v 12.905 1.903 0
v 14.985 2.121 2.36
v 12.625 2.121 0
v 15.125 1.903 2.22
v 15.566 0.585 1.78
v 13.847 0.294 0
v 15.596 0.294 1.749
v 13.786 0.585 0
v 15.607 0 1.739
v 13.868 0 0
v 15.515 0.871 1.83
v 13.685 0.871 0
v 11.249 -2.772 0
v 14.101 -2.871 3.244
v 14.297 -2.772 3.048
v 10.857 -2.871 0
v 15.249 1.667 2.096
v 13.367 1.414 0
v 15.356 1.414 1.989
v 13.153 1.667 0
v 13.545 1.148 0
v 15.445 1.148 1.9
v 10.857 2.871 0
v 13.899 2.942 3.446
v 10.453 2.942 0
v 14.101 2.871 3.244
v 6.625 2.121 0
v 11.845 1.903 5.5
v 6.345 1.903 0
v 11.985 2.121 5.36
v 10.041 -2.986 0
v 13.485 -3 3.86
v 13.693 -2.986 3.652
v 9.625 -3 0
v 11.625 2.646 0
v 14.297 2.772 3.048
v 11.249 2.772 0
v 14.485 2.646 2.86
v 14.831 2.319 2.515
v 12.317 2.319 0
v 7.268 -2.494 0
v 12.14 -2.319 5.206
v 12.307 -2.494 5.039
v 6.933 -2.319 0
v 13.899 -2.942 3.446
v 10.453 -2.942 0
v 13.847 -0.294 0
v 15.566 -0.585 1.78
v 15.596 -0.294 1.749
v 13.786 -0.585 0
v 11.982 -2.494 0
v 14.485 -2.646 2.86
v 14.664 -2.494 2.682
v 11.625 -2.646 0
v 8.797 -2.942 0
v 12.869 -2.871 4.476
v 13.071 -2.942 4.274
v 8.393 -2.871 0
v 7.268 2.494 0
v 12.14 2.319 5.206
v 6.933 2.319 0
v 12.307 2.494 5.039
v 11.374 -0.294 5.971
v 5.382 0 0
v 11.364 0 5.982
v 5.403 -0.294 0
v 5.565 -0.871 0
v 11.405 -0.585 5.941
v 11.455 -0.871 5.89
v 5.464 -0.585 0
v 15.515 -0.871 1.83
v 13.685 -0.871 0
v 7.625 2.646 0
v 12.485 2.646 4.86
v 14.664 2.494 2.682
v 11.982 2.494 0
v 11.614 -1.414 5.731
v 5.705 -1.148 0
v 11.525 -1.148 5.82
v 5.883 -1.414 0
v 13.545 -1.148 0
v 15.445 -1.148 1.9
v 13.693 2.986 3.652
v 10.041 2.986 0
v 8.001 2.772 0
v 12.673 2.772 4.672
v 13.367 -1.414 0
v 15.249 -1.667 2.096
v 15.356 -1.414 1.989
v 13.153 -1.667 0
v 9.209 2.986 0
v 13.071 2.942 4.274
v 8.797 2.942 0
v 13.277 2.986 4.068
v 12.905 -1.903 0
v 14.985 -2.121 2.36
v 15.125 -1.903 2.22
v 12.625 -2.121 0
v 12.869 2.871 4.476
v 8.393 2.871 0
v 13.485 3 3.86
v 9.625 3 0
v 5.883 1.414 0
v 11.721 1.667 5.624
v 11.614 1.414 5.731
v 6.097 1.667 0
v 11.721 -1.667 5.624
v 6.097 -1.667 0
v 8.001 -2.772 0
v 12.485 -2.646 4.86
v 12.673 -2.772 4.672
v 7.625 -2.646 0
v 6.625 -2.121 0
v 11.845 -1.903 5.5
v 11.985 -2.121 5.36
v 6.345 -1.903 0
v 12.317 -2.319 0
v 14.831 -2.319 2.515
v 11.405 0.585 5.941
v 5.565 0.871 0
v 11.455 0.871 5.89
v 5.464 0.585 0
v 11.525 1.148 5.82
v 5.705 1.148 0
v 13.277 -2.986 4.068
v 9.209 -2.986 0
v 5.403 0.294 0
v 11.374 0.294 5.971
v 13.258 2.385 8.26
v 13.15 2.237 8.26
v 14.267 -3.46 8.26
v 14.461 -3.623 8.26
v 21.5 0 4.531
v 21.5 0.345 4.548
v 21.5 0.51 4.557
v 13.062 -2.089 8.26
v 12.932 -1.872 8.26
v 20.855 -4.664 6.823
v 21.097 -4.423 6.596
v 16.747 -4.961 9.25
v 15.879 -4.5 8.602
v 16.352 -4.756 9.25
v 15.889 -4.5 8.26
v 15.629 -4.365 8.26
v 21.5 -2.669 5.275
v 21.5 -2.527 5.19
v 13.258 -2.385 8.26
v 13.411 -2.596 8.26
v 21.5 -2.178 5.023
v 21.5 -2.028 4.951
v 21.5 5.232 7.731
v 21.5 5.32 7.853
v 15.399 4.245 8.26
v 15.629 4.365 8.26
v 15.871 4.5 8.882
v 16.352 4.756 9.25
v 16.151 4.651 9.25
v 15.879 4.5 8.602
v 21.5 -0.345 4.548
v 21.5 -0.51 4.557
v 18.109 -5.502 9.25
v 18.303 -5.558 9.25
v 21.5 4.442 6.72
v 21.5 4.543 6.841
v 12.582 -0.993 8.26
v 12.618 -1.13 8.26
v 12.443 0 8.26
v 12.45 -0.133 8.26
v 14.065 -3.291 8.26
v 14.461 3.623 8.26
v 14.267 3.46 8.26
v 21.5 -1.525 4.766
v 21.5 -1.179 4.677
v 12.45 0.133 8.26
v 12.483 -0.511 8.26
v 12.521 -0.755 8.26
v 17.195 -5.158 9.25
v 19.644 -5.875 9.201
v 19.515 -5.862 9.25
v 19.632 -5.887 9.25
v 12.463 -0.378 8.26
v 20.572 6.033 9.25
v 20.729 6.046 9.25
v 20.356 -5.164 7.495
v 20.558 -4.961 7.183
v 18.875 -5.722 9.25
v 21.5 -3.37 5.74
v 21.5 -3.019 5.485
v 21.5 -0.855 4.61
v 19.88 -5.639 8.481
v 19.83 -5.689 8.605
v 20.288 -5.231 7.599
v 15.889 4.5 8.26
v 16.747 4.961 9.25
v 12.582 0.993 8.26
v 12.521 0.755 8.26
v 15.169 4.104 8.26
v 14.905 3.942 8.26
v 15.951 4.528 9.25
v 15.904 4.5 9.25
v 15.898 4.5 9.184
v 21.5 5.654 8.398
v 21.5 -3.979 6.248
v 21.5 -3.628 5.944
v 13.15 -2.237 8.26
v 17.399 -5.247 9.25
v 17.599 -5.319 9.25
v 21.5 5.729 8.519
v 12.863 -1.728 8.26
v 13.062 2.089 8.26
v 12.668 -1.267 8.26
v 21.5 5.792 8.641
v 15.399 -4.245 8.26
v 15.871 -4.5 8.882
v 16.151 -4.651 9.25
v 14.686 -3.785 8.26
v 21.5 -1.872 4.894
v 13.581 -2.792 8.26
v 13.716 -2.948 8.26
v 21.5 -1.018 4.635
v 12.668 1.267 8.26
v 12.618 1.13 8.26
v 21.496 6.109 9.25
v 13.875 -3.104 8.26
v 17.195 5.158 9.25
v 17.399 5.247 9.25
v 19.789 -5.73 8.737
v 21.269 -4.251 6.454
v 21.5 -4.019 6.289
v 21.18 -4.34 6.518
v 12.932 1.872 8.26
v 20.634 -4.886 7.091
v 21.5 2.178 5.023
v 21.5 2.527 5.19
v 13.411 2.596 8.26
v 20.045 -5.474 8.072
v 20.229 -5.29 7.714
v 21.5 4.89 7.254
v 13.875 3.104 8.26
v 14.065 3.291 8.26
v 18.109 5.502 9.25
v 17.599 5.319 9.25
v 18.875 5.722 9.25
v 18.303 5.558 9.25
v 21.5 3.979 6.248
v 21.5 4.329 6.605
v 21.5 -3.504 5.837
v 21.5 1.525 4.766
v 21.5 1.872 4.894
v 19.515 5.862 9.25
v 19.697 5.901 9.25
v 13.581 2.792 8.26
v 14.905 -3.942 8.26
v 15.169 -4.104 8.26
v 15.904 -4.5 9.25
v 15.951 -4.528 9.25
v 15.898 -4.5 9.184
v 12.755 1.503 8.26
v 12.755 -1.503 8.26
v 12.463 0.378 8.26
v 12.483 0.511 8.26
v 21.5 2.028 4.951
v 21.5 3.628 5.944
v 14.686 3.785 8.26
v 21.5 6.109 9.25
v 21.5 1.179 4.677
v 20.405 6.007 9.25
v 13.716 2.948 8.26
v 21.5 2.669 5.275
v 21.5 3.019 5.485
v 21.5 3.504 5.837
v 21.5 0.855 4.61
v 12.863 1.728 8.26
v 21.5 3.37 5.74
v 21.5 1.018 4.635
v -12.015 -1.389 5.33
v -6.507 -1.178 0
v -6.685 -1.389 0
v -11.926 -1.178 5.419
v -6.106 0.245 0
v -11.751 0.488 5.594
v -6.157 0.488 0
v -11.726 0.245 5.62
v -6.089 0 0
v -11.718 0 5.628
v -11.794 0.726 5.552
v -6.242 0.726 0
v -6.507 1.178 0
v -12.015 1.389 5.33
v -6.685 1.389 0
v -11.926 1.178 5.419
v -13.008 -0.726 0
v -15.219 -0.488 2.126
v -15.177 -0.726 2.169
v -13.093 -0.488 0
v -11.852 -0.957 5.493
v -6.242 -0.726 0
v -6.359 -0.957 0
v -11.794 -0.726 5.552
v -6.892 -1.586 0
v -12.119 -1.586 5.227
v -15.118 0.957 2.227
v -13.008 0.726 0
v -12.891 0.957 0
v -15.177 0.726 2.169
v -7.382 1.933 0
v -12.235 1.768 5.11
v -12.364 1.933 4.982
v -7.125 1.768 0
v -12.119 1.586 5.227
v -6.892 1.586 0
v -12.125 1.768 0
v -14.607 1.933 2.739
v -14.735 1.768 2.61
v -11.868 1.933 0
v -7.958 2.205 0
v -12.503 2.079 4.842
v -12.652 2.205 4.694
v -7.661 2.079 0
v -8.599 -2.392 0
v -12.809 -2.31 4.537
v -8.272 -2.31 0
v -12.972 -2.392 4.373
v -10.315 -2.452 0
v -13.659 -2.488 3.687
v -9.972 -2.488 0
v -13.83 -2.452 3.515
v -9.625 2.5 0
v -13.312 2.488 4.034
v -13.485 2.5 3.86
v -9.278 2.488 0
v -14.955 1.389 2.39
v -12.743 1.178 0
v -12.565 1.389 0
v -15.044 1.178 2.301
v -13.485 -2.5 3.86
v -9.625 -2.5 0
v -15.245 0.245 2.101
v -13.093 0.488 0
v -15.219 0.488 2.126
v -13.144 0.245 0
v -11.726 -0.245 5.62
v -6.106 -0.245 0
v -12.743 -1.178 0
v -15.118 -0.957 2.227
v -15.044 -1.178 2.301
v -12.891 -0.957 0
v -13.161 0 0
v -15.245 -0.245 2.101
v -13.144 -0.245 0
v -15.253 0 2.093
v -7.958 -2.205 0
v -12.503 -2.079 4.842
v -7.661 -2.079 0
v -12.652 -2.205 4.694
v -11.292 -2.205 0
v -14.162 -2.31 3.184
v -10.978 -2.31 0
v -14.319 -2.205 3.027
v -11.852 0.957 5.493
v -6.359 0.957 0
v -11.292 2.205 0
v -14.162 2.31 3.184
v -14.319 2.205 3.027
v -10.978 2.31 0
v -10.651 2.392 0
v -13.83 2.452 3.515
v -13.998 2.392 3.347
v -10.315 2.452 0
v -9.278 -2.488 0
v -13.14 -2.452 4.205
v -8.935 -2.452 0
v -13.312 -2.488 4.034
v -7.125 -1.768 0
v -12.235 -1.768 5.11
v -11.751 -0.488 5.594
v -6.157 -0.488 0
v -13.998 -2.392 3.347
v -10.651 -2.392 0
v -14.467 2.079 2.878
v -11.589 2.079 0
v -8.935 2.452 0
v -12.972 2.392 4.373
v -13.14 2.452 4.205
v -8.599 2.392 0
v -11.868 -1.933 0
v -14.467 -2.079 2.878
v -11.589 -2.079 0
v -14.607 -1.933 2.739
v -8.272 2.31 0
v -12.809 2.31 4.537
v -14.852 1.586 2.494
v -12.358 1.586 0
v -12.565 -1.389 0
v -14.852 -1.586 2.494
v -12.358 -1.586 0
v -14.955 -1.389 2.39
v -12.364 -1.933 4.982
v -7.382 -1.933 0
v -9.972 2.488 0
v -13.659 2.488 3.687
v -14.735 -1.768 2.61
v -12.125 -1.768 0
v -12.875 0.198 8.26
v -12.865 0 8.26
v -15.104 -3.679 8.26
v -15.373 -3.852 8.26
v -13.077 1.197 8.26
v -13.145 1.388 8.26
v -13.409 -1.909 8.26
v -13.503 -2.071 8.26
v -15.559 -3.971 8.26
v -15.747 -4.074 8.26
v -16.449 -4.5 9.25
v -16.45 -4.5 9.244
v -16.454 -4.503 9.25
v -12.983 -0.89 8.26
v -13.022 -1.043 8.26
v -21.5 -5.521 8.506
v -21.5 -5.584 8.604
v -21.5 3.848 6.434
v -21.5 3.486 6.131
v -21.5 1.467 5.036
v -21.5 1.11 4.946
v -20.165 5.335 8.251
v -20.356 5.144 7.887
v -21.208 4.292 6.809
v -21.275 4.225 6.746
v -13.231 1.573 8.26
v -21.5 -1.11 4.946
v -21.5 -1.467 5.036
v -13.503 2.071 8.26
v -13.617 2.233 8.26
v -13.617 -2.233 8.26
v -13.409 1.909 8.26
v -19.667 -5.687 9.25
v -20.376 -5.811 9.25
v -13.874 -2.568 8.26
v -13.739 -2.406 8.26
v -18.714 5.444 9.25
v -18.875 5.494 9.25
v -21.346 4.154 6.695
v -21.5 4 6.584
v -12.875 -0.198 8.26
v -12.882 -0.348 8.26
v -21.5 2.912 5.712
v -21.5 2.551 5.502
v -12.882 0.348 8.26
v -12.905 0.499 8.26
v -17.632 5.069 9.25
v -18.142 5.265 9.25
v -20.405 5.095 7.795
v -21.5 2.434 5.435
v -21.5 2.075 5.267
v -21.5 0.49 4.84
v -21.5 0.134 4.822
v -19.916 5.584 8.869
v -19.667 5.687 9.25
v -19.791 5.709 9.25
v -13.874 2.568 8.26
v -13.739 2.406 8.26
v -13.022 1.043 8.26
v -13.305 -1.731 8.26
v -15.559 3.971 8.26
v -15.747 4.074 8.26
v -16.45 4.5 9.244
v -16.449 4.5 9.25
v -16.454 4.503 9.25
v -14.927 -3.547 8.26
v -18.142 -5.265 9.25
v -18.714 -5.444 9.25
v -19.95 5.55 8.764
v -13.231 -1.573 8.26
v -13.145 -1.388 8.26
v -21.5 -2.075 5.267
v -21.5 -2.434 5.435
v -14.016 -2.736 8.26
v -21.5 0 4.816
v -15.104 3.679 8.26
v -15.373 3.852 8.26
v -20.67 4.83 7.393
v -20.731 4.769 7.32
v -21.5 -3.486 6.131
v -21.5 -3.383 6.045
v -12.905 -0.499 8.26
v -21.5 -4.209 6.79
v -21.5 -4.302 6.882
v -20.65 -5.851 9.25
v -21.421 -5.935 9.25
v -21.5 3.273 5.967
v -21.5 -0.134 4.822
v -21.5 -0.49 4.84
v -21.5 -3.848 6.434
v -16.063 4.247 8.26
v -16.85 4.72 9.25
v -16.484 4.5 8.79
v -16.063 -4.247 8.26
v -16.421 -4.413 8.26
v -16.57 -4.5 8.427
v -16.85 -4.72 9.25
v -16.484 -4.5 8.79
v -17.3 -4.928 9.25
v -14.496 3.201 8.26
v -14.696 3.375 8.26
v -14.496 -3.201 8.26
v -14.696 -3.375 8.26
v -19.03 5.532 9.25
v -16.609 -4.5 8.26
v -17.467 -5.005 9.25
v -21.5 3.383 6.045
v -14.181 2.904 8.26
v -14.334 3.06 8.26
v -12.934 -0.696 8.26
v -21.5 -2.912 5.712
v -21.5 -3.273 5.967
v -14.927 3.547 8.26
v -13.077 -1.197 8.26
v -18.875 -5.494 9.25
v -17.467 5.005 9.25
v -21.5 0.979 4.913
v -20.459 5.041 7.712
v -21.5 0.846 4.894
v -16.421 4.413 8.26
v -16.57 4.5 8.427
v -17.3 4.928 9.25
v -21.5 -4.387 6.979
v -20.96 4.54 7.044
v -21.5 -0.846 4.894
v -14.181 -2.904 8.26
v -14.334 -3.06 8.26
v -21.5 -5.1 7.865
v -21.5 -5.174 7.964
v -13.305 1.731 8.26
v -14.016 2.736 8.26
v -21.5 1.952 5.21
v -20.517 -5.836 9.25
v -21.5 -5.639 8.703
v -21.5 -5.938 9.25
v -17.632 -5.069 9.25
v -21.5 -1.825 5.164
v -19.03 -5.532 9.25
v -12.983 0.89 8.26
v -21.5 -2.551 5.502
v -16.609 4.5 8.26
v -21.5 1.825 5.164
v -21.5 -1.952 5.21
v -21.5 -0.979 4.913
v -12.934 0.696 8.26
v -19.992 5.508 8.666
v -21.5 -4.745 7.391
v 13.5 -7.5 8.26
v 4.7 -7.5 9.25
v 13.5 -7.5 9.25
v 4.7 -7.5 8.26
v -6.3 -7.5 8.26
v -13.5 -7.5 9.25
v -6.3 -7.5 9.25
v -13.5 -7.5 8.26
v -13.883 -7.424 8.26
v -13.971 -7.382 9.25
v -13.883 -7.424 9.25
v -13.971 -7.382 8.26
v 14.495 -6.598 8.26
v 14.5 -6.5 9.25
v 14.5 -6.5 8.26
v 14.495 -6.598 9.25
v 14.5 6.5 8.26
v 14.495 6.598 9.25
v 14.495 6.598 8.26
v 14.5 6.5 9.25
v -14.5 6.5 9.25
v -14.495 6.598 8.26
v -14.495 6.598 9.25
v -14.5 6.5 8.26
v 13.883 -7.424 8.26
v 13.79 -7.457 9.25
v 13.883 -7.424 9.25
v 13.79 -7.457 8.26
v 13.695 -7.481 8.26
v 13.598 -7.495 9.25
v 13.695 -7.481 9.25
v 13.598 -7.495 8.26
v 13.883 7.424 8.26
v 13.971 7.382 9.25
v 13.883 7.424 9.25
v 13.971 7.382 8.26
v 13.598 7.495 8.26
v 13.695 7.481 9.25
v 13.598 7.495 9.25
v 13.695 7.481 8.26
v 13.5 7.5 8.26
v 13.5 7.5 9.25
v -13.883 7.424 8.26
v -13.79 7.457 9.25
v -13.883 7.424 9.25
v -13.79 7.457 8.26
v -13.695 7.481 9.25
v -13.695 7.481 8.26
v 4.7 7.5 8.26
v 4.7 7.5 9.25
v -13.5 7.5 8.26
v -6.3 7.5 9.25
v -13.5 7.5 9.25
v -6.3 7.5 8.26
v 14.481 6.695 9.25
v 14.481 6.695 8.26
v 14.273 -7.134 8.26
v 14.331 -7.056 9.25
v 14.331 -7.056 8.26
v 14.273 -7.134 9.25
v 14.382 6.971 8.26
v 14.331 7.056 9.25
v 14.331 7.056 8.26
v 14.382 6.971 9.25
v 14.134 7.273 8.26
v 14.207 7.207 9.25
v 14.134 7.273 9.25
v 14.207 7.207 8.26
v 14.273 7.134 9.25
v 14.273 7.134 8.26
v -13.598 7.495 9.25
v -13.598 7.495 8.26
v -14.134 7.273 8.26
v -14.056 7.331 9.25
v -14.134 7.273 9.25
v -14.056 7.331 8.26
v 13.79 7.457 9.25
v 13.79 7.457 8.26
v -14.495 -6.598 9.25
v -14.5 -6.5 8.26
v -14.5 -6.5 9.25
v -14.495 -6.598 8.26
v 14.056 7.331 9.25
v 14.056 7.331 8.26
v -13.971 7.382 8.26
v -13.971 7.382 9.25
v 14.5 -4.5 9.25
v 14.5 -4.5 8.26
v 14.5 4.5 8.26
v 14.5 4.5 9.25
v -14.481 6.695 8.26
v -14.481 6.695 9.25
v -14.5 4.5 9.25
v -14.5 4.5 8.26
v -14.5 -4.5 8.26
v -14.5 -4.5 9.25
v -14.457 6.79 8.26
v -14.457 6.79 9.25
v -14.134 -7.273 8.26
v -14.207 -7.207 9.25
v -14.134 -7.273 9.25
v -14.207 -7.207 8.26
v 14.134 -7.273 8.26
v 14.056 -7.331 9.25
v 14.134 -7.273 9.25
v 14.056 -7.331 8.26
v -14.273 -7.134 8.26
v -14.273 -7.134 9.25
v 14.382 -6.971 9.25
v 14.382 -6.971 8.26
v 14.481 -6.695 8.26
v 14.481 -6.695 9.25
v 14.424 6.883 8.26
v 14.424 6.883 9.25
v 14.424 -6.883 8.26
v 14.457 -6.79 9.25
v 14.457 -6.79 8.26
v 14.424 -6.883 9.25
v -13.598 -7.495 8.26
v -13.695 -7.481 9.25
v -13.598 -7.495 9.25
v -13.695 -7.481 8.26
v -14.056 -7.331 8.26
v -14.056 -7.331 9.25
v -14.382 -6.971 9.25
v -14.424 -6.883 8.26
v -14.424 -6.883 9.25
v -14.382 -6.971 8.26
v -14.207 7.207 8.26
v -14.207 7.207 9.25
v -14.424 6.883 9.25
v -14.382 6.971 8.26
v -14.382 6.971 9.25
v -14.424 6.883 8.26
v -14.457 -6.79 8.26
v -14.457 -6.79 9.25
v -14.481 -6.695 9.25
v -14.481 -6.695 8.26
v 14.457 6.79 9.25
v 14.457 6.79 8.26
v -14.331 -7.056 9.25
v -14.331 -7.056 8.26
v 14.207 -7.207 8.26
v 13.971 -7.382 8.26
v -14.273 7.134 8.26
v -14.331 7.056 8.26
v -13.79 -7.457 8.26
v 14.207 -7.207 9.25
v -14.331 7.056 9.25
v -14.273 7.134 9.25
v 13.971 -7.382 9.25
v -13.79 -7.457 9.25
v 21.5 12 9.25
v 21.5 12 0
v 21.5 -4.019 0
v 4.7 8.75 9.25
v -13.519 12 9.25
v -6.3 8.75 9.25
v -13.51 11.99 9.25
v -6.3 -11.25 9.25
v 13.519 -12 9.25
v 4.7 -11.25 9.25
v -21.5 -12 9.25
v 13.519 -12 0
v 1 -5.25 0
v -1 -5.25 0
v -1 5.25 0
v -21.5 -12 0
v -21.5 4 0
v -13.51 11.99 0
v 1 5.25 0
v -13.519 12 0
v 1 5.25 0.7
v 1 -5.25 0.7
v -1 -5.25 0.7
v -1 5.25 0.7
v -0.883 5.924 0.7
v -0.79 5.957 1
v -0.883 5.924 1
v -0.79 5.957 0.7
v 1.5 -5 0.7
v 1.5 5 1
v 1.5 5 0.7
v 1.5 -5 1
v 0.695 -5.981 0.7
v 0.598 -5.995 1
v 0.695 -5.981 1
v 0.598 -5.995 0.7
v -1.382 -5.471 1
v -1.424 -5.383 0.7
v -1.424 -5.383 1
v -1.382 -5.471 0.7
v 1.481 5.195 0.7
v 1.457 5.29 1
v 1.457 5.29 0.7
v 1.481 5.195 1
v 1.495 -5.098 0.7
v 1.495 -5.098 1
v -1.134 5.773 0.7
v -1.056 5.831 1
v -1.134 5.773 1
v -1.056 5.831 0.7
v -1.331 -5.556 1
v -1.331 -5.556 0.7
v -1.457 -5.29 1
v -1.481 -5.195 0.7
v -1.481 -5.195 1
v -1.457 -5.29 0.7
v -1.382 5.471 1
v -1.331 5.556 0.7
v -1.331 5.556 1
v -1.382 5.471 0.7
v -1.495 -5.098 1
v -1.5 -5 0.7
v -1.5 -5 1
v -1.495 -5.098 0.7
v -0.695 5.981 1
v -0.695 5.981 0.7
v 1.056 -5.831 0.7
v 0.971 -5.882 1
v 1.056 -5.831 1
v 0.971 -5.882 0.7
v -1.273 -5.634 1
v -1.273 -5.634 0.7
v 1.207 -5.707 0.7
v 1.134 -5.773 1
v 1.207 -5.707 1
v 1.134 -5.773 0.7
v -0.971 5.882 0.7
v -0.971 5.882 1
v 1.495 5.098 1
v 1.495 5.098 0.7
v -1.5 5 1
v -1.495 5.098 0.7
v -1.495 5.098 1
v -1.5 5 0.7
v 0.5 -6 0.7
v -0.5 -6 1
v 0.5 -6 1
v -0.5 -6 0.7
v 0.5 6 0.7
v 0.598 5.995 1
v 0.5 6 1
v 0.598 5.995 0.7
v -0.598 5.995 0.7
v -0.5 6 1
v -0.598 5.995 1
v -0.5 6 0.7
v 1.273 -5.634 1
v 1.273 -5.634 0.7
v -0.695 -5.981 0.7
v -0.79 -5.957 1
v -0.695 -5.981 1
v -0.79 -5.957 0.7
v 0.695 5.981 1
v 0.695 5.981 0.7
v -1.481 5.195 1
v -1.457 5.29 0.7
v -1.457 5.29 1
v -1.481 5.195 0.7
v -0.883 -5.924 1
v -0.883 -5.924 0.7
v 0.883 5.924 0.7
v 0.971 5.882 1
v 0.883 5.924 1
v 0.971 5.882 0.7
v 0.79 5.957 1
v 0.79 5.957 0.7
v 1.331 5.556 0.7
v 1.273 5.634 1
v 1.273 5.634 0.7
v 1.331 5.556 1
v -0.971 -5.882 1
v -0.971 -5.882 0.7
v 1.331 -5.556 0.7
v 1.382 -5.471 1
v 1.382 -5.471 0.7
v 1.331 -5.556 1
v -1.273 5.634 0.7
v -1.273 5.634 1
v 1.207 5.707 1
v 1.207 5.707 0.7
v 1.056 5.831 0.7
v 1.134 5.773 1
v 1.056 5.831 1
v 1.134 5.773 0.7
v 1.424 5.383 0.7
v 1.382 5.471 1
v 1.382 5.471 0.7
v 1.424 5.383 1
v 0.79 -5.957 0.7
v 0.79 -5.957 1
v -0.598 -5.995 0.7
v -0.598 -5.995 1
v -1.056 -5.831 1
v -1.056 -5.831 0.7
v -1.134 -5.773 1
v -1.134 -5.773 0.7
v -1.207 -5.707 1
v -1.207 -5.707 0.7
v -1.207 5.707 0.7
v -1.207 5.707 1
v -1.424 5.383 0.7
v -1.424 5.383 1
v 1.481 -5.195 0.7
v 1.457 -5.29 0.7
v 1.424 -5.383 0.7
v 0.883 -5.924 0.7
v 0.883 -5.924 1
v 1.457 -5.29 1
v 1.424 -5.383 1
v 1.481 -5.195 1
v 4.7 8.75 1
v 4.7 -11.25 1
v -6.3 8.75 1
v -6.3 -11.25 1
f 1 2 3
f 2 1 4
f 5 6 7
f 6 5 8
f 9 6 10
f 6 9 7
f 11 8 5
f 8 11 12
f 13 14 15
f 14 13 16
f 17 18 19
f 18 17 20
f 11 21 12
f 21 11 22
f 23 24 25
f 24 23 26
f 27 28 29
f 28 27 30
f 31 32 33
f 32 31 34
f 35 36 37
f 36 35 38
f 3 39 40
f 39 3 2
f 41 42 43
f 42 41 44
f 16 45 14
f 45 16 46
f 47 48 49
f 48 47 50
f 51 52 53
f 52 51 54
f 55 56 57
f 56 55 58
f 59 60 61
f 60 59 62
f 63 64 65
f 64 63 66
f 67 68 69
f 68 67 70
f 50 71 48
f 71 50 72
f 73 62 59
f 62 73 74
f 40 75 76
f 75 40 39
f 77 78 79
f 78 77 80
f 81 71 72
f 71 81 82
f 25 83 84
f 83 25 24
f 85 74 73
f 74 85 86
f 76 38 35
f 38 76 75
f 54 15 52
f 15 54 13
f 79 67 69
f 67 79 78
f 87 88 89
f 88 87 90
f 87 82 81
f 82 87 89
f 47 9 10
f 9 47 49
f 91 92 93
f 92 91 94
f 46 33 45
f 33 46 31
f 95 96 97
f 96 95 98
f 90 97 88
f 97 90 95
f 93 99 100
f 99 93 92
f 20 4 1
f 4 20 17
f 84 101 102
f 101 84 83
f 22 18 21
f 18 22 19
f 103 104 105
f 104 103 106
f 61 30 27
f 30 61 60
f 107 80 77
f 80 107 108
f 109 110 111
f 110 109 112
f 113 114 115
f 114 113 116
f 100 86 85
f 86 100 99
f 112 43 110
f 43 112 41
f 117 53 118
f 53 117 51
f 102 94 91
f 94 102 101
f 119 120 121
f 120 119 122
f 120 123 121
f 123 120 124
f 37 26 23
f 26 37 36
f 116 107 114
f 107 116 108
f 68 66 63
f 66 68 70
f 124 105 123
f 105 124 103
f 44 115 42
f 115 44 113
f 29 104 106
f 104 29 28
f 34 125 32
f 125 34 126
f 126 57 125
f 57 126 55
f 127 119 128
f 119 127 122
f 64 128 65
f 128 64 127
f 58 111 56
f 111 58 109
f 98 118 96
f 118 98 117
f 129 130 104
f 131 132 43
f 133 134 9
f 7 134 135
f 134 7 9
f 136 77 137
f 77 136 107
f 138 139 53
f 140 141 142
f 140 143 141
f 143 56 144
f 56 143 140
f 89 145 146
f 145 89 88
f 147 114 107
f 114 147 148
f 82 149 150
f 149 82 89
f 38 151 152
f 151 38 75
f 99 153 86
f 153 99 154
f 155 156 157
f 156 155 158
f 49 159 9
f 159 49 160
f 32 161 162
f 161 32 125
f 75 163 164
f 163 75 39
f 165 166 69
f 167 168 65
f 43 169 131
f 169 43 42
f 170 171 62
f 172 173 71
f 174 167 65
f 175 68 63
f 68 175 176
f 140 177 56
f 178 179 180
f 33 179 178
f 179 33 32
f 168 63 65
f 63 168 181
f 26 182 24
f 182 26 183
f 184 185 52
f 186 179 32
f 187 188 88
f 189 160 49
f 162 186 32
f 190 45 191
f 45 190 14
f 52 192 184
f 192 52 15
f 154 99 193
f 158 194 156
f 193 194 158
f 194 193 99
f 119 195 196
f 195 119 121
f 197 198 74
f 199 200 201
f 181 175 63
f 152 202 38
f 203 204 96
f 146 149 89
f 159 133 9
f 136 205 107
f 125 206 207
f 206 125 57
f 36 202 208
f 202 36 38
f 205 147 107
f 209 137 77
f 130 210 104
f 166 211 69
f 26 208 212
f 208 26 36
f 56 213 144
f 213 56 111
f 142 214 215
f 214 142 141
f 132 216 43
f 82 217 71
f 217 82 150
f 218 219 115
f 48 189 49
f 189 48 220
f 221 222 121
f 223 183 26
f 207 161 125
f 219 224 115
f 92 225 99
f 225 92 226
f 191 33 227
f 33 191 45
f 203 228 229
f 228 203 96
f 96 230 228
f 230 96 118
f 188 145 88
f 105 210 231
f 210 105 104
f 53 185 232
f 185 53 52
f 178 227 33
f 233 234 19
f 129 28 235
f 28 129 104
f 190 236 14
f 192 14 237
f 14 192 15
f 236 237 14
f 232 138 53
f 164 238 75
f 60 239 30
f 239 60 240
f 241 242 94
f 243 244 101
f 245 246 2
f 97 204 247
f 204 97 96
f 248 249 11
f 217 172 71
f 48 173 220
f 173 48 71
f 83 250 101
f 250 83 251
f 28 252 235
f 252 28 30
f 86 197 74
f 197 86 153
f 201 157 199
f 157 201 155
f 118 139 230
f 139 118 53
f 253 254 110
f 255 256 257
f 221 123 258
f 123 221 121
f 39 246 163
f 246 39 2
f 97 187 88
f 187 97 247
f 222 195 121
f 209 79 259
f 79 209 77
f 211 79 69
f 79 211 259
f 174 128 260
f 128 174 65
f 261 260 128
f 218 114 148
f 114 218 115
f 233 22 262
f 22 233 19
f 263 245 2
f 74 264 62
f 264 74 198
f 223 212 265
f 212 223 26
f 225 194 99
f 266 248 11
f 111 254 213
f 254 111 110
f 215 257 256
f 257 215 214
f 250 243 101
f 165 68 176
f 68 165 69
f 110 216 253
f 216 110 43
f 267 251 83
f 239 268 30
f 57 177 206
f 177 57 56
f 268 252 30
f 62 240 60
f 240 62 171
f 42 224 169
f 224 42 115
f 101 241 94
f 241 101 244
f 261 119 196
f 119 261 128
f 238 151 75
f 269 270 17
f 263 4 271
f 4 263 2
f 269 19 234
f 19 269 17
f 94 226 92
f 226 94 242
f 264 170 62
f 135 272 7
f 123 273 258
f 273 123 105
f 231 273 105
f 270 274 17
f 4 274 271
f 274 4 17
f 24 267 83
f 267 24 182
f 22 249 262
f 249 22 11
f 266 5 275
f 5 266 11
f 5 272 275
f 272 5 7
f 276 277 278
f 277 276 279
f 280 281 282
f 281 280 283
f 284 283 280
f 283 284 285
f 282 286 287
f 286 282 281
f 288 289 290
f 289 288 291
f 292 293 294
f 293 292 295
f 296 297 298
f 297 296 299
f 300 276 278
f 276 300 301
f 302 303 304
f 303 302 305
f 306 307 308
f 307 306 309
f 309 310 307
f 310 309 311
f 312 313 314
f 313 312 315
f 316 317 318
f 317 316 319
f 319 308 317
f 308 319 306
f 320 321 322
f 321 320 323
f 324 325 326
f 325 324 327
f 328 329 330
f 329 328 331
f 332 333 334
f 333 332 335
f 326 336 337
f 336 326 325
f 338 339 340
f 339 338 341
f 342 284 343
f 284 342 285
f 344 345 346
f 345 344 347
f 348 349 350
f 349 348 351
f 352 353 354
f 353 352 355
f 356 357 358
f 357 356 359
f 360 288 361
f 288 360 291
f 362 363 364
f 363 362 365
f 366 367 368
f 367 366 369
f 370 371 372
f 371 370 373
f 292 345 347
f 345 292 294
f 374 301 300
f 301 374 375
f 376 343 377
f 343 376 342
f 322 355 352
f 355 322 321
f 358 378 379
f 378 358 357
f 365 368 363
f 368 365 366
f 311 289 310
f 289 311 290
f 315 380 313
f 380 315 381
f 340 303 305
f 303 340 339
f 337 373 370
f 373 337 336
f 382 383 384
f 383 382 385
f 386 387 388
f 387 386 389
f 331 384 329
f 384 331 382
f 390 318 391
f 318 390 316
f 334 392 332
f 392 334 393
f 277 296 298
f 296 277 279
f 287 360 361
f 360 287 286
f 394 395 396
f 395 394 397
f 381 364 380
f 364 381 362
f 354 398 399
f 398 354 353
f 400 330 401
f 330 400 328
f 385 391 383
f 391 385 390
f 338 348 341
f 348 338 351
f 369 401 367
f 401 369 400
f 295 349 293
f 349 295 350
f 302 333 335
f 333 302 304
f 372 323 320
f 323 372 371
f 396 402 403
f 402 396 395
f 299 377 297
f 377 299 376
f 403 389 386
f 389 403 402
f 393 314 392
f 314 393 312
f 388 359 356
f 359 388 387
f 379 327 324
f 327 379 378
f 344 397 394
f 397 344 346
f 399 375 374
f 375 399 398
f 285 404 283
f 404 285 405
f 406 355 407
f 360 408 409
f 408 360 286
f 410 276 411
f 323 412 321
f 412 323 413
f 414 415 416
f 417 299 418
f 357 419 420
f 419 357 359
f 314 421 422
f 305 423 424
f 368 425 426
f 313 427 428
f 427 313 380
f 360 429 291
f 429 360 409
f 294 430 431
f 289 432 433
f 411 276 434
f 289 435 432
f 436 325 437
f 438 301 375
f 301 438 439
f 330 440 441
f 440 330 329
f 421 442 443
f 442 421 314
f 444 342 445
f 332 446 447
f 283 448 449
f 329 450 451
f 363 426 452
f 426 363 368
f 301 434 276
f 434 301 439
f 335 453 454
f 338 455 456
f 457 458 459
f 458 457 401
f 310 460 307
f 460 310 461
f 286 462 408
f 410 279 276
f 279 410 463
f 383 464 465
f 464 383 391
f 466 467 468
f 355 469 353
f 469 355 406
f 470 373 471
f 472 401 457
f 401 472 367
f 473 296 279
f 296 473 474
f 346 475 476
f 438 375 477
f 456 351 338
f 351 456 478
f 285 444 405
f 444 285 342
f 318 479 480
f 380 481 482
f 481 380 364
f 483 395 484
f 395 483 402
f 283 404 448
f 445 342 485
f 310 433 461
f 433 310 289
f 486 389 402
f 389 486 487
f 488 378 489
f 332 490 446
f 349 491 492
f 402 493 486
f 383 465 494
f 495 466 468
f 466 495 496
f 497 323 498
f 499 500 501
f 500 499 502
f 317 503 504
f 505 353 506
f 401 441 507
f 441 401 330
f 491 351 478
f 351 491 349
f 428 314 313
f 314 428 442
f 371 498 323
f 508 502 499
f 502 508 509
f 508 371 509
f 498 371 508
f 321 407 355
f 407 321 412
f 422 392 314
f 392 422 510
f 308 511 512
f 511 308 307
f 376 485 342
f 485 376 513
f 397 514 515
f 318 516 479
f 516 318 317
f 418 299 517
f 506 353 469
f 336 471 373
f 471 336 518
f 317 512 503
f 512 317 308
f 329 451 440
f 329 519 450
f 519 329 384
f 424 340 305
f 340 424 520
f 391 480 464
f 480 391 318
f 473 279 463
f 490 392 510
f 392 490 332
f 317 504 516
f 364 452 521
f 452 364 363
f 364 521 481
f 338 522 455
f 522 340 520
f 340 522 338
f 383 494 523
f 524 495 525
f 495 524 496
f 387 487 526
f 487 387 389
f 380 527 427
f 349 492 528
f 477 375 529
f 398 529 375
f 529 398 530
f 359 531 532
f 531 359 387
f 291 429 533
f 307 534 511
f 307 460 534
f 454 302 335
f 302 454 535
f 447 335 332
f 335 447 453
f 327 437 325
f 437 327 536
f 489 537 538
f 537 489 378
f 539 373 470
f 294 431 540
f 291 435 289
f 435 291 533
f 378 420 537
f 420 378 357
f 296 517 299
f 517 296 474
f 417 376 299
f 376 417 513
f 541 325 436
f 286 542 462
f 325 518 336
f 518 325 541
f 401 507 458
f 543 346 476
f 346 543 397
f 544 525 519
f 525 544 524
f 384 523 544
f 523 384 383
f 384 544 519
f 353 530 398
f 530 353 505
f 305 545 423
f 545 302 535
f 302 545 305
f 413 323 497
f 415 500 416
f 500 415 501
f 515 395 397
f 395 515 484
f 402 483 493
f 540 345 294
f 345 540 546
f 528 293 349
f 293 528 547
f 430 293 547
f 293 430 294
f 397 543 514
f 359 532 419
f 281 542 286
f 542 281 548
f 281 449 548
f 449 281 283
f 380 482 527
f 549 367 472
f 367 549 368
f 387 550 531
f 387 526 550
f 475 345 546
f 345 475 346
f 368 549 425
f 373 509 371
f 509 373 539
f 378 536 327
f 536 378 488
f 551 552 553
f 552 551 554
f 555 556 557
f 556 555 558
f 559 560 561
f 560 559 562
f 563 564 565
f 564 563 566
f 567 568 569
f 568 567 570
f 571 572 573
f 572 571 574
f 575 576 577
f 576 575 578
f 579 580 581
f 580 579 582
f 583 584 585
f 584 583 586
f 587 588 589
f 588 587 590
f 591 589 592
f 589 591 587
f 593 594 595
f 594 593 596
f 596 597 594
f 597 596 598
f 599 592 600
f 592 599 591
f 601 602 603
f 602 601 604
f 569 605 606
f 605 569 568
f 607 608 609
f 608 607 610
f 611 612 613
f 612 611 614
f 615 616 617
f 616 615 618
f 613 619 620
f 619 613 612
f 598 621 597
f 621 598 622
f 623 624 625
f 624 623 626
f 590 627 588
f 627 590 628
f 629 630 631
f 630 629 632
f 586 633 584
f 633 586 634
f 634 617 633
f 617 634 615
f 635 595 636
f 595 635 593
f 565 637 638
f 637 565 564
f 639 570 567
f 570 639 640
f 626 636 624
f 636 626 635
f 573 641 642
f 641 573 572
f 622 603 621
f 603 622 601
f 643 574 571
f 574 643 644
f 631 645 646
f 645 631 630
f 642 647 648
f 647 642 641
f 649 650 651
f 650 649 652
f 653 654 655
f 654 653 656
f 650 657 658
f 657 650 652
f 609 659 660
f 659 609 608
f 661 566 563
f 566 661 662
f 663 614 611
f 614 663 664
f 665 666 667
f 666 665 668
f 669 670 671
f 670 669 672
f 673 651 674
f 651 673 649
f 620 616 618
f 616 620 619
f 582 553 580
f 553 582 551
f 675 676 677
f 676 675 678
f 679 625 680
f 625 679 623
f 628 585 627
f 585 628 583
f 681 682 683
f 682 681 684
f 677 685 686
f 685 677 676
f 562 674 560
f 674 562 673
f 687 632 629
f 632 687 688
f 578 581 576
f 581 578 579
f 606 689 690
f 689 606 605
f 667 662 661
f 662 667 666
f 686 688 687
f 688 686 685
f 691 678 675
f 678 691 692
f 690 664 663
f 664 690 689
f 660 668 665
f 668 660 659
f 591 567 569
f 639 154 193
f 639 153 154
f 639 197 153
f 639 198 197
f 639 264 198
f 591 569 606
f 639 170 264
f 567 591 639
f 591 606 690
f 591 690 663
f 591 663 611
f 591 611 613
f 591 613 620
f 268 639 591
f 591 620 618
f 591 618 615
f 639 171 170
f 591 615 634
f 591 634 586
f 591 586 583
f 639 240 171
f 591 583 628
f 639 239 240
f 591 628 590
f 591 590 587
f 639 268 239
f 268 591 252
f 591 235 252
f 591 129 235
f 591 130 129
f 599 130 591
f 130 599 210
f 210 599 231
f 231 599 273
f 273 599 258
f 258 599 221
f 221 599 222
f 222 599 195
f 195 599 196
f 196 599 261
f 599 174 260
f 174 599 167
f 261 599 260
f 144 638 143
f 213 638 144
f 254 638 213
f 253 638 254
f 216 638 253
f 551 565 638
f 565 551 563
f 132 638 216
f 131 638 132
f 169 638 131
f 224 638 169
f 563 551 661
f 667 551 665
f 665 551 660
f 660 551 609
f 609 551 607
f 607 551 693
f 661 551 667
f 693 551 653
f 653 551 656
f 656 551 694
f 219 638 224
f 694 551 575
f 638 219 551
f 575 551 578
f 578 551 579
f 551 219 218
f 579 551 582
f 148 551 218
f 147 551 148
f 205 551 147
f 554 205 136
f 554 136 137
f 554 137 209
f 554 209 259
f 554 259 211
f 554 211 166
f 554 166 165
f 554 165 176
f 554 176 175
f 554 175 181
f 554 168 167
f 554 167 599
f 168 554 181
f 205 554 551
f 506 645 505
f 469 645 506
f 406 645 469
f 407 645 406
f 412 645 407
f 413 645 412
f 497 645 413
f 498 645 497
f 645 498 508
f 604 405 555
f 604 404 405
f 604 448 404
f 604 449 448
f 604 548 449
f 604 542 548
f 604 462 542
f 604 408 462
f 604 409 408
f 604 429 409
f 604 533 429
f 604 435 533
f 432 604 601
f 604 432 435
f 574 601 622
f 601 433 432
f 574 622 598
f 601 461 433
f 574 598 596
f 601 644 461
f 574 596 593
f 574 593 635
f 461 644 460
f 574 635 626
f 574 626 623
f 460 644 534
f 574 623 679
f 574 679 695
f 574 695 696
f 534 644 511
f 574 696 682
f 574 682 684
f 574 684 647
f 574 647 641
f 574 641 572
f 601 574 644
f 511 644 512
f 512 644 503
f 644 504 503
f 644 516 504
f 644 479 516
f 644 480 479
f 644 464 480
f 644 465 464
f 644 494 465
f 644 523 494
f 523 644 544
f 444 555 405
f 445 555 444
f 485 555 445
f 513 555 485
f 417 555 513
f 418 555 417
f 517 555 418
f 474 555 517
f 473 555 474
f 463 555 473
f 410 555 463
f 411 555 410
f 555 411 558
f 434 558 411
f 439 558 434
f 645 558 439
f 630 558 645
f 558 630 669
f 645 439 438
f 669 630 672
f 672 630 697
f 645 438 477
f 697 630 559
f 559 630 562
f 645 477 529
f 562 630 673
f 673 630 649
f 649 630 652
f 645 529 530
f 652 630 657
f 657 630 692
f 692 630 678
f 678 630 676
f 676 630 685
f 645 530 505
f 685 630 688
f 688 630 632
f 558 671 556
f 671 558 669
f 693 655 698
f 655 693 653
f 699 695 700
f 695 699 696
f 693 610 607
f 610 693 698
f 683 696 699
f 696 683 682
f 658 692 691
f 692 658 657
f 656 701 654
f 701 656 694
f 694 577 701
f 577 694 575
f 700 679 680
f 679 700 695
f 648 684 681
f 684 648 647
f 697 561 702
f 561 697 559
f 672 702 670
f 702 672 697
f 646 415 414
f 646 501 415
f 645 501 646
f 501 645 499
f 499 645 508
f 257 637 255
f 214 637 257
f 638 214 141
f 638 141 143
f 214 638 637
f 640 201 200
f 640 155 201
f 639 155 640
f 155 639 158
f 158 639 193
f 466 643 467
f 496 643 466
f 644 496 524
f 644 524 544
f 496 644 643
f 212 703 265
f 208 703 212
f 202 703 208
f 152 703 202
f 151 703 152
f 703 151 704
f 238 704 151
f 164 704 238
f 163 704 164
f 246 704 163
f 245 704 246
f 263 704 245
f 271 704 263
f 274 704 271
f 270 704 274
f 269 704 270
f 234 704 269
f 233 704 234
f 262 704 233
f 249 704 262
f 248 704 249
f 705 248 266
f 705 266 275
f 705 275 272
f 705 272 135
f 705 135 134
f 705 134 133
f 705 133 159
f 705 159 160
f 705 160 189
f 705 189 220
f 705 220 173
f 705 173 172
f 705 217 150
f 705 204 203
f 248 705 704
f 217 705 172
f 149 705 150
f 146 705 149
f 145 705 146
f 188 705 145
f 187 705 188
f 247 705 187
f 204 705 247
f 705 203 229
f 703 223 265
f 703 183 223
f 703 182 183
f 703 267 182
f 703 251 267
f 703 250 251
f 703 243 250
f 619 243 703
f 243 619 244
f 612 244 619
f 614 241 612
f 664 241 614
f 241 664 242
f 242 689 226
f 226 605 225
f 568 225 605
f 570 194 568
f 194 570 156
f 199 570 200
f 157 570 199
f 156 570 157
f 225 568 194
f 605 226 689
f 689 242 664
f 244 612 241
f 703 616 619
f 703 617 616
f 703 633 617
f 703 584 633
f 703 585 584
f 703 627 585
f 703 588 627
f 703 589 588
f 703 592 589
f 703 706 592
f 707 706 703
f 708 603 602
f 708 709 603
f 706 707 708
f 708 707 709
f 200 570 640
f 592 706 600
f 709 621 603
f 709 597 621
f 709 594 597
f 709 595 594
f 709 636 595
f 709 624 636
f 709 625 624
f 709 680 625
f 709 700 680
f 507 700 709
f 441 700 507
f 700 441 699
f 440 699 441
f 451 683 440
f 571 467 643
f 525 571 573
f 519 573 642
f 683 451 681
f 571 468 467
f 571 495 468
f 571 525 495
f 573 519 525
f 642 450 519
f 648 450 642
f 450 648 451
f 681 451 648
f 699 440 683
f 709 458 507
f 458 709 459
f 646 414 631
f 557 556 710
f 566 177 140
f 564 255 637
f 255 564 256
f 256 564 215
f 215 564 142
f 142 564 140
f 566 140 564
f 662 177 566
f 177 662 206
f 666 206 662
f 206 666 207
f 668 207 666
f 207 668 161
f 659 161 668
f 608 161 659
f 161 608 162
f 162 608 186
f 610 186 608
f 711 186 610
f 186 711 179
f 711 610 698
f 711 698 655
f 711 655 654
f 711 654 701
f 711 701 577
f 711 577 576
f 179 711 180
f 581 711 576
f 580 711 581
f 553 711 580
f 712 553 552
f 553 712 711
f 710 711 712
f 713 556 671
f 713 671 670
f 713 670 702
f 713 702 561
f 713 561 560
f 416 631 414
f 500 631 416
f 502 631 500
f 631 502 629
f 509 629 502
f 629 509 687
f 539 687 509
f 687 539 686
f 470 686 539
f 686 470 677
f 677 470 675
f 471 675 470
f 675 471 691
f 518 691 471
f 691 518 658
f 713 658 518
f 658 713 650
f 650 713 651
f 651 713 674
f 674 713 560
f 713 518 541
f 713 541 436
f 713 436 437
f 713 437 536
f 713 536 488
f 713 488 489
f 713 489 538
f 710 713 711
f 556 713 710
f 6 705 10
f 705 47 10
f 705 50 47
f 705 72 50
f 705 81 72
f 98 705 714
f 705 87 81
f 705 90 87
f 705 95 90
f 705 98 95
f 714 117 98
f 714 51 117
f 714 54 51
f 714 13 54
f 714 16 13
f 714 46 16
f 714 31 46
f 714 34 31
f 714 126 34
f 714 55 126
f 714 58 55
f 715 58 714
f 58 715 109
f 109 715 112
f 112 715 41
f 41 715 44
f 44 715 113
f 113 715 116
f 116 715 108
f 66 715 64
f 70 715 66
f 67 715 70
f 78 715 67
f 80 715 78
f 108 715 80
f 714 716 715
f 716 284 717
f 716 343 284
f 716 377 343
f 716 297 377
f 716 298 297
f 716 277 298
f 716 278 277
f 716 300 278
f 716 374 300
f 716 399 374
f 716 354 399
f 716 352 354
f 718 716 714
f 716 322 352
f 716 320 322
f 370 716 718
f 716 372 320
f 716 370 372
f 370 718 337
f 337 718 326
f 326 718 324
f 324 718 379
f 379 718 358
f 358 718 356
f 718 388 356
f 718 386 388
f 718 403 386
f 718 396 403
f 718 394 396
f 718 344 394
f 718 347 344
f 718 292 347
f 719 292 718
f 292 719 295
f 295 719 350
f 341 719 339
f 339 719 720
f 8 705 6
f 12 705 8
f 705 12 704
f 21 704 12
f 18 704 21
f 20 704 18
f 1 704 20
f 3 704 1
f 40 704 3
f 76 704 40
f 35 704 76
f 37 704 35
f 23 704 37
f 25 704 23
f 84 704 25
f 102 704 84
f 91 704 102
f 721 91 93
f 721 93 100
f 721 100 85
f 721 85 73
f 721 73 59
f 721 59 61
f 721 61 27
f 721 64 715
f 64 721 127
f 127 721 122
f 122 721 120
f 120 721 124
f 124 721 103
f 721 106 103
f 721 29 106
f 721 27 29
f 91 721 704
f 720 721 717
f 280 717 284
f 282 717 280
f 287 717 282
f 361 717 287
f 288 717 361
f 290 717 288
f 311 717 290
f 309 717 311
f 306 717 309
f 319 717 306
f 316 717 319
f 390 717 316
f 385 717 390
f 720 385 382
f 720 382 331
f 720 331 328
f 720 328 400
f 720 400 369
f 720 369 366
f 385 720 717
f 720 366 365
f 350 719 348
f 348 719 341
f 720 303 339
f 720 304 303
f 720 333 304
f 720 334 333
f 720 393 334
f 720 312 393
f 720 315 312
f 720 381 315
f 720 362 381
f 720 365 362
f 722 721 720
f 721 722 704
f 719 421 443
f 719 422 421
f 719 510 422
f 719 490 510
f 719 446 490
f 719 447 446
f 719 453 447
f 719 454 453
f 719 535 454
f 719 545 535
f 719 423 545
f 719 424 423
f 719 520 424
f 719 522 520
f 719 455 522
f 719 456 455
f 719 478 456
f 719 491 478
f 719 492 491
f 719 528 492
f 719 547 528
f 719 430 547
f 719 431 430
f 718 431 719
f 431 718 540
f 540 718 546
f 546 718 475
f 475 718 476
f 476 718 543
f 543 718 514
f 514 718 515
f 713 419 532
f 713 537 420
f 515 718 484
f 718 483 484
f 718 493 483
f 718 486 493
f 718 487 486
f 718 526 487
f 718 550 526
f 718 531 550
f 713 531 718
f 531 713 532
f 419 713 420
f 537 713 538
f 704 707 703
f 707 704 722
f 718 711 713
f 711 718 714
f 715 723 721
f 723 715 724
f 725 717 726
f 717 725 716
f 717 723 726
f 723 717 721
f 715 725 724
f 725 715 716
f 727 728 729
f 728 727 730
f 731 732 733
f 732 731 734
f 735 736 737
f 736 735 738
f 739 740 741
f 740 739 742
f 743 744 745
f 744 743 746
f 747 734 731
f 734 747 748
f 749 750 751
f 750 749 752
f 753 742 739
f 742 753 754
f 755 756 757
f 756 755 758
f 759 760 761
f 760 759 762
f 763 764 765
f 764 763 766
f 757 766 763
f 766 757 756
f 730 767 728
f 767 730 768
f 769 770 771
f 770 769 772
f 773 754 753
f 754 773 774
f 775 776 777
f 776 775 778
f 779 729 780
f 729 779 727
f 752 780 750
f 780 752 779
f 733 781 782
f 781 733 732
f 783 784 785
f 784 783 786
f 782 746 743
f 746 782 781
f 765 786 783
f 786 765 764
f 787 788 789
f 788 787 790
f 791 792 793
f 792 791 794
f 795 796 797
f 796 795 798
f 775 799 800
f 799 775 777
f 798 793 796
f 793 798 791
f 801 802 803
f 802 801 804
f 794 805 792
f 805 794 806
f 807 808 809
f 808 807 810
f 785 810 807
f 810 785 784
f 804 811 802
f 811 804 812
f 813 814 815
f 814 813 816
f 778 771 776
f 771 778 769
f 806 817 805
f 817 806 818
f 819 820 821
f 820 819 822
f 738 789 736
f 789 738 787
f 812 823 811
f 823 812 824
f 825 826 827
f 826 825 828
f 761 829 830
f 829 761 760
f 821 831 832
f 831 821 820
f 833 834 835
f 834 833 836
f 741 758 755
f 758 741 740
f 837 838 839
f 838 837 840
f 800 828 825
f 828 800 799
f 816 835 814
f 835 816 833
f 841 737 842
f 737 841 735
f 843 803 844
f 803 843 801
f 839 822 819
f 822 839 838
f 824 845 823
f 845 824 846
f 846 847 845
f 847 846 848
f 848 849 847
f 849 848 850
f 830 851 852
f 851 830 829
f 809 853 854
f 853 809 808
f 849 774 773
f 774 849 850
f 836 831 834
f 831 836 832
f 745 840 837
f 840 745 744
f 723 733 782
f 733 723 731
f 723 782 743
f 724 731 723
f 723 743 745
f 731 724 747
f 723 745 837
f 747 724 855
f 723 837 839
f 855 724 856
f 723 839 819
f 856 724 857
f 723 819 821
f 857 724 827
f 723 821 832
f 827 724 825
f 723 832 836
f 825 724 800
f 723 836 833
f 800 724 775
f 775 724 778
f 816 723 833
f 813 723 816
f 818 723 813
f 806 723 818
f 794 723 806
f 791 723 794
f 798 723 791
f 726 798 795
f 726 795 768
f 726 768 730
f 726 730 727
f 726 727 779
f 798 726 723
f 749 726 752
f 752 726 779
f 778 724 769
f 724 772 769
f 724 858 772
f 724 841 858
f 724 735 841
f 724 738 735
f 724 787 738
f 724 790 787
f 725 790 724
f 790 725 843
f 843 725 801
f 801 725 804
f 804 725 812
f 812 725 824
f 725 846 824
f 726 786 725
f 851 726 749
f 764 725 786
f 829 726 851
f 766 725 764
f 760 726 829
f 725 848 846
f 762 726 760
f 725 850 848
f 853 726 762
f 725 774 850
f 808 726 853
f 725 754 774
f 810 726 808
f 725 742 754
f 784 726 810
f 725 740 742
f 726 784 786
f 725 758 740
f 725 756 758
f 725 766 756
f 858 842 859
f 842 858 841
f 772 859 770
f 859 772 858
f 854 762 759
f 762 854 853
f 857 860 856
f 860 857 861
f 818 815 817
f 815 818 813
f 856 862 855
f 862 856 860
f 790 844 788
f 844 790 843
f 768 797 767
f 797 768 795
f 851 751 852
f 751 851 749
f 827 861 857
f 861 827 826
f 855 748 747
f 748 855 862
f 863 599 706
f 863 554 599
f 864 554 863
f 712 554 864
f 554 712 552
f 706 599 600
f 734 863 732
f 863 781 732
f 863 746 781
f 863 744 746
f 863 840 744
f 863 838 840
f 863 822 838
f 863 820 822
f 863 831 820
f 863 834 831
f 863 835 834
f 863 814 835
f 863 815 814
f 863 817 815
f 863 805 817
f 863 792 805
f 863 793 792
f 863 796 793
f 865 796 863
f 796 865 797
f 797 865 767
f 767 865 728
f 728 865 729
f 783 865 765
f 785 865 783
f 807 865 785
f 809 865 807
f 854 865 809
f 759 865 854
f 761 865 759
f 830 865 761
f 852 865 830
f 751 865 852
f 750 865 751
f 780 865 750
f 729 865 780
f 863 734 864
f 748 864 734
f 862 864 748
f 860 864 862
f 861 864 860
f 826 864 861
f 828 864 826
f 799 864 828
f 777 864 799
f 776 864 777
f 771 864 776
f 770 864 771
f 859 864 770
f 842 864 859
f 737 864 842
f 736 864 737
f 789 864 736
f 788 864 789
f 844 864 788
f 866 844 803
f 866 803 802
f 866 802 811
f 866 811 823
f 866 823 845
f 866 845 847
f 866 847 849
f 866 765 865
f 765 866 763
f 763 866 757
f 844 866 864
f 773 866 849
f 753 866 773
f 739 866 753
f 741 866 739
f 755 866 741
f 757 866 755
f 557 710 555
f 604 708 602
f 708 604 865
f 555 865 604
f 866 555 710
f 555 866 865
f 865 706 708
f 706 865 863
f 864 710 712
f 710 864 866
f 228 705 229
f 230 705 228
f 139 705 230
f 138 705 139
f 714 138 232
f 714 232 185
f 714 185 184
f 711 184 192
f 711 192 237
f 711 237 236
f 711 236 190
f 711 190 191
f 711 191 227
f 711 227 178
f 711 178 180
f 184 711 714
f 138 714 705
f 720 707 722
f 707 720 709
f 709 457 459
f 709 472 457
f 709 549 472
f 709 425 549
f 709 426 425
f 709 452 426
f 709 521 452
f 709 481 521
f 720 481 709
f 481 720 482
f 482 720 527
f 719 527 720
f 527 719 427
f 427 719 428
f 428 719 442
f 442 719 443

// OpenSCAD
// file: roundedrect.scad
$fn=64;


// size - [x,y,z]
// radius - radius of corners
// DEPRECATED!!
module roundedRect(size, radius, center=false)
{
    x = size[0];
    y = size[1];
    z = size[2];
    translate([0,0,z/2])
    _cube_vertex_smooth2d([x,y,z],radius);
}


// size - [x,y,z]
// radius - radius of corners
module _cube_vertex_smooth3d(size,radius=1)
{
    minkowski() {
        cube([size[0]-radius*2,
              size[1]-radius*2,
              size[2]-radius*2],
             center=true);
        sphere(r=radius);
    }
}

module cube_vertex_smooth3d(size,radius=1,center=false)
{
    if (center) {
        _cube_vertex_smooth3d(size,radius);
    } else {
        translate([size[0]/2,size[1]/2,size[2]/2])
        _cube_vertex_smooth3d(size,radius);
    }
}

module _cube_vertex_smooth2d(size,radius=1)
{
    minkowski() {
        cube([size[0]-radius*2,
              size[1]-radius*2,
              size[2]],
             center=true);
        cylinder(h=0.01,r=radius);
    }
}

// size - [x,y,z]
// radius - radius of corners
module cube_vertex_smooth2d(size,radius=1,center=false)
{
    if (center) {
        _cube_vertex_smooth2d(size,radius);
    } else {
        translate([size[0]/2,size[1]/2,size[2]/2])
        _cube_vertex_smooth2d(size,radius);
    }
}

//translate([10,10,0])
color("blue")
cube([10,10,10],center=true);
color("blue")
cube([10,10,10]);


translate([10,0,0]) {
    color("red")
    cube_vertex_smooth2d([10,10,10],3,center=true);
    color("red")
    cube_vertex_smooth2d([10,10,10],3,center=false);
}

translate([20,0,0]) {
    color("yellow")
    cube_vertex_smooth3d([10,10,10],3,center=true);
    color("yellow")
    cube_vertex_smooth3d([10,10,10],3,center=false);
}

translate([30,0,0]) {
    color("purple")
    roundedRect([10,10,10],3,center=true);
}

//translate([10,0,0]) {
//    cube_vertex_smooth2d([10,10,10],2);
//}
//
//translate([20,0,0]) {
//    cube_vertex_smooth3d([10,10,10],2);
//}
// main file
/*
 * Copyright (C) 2015 Richard Hughes <richard@hughsie.com>
 *
 * Licensed under the CERN Open Hardware Licence v1.1
 *
 * Through this CERN Open Hardware Licence ("CERN OHL") version 1.1, the
 * Organization wishes to disseminate its hardware designs (as published
 * on http://www.ohwr.org/) as widely as possible, and generally to
 * foster collaboration among public research hardware designers.  The
 * CERN OHL is copyright of CERN. Anyone is welcome to use the CERN OHL,
 * in unmodified form only, for the distribution of his own Open Hardware
 * designs. Any other right is reserved.
 */

use <roundedrect.scad>

$fn=64;

// This is a the insert
module colorhug_lightguide(transparency=1.0)
{
    size_x=43;
    size_y=24;
    size_z=9.25;
    color=[0.2,0.2,0.25,transparency];

    //rotate([180,0,0])
    translate([0,0,size_z/2]) {
        difference() {

            color(color)
            cube([size_x,size_y,size_z],center=true);

            // UV LED slot
            translate([5,0,-size_z])
            color([1,0,1,transparency])
            rotate([0, 45, 0]) {
                cylinder(d=6, h=30);
                translate([0,0,12])
                cylinder(r1=3, r2=8, h=14);
            }

            // lamp slot
            translate([-5,0,-size_z]) {
                color([0.8,0.8,0,transparency])
                rotate([0, -45, 0]) {
                    cylinder(d=5, h=30);
                    translate([0,0,12])
                    cylinder(r1=2.5, r2=8, h=14);
                }
            }

            // resistors on back
            color([0.1,0.1,0.4,transparency])
            translate([0,0,size_z/2-0.49]) {
                cube_vertex_smooth2d([29,15,1],1,center=true);
                cube_vertex_smooth2d([size_x,9,1],1,center=true);
            }

            // sensor slot
            translate([0,0,0])
            color([0.1,0.1,0.4,transparency])
            cube([2,10.5,size_z+1],center=true);
            color([0.1,0.1,0.5,transparency])
            cube_vertex_smooth2d([3,12,size_z-1.40],1,center=true);

            translate([-0.8,-1.25,1])
            color([0.1,0.1,0.4,transparency])
            cube([11,20,size_z],center=true);

            // cut the corners off
            translate([size_x/2,-size_y/2-8,-size_z/2-1])
            rotate([0,0,45])
            color([0.5,0.5,0.5,transparency])
            cube([11.3,11.3,size_z+2]);

            // cut the corners off
            translate([-size_x/2,size_y/2-8,-size_z/2-1])
            rotate([0,0,45])
            color([0.5,0.5,0.5,transparency])
            cube([11.3,11.3,size_z+2]);
        }
    }
}

colorhug_lightguide();
